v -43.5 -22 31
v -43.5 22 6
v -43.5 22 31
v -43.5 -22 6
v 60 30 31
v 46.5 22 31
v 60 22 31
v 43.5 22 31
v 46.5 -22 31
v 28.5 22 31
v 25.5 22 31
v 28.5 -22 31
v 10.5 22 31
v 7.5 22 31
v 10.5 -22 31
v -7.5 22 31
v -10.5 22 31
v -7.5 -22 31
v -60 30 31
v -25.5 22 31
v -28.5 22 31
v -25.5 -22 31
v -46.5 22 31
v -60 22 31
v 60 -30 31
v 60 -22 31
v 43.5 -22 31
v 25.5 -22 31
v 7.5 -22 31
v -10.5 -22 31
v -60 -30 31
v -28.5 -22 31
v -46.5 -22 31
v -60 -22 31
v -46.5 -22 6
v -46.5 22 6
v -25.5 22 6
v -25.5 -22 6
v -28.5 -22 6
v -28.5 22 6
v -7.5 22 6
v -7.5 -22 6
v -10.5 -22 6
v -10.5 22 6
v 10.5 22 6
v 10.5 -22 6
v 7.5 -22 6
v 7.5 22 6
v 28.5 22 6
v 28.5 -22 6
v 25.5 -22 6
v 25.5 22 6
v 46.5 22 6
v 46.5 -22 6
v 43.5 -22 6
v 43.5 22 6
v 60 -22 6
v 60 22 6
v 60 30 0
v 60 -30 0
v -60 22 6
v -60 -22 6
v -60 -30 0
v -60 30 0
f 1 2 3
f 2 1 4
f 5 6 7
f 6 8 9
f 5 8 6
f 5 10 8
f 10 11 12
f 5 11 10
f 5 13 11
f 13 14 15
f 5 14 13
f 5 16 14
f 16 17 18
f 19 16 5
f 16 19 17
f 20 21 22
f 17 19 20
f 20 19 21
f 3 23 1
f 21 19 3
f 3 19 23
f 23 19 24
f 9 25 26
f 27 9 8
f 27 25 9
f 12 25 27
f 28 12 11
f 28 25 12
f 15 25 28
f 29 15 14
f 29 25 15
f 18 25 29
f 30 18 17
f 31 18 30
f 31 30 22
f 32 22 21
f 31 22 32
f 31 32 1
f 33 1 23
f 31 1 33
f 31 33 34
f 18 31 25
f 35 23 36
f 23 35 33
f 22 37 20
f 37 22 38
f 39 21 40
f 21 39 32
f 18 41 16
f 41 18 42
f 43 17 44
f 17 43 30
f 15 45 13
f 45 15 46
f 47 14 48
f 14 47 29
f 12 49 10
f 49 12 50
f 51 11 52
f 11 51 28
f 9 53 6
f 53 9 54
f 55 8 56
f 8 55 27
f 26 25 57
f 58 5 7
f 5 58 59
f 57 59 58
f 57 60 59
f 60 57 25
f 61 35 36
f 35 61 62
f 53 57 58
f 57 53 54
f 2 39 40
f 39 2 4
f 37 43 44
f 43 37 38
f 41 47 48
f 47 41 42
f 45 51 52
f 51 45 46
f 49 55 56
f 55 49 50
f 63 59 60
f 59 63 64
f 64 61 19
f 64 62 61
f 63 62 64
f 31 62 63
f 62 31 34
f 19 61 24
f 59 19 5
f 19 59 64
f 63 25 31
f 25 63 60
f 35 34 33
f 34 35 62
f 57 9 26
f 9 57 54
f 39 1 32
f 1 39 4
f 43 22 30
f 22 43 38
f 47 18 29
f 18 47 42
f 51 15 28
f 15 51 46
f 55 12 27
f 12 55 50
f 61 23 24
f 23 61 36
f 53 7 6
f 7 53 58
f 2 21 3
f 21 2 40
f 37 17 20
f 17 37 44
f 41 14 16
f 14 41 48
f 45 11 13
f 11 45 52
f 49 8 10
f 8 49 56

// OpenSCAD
$fn = 32;

// ----------------------------------------------------------------------
// Rib frame 120 x 60 x 31
// 6 ribs at 18 mm pitch
// ----------------------------------------------------------------------

// --- parameters (mm) ---
frame = [120, 60, 6];  // base plate size (x, y, z)
rail_w = 8;            // side rail width
ribs = 6;              // number of ribs
rib_t = 3;             // rib thickness
rib_h = 25;            // rib height above the base plate
pitch = 18;            // pitch between rib centres

// --- derived feature positions (mm) ---
span = (ribs - 1) * pitch;          // = 90   distance between the outer ribs
origin_x = -span / 2;               // = -45   X of the first rib
rib_len = frame[1] - 2 * rail_w + 2;  // = 46   rib length, 1 mm into each rail
feature_centers = [
  [origin_x + 0 * pitch, 0],
  [origin_x + 1 * pitch, 0],
  [origin_x + 2 * pitch, 0],
  [origin_x + 3 * pitch, 0],
  [origin_x + 4 * pitch, 0],
  [origin_x + 5 * pitch, 0]
];   // rib centre line, drives the rib loop

// base plate, two side rails, then the ribs read straight off feature_centers
union() {
  translate([-frame[0] / 2, -frame[1] / 2, 0]) cube(frame);
  translate([-frame[0] / 2, -frame[1] / 2, 0]) cube([frame[0], rail_w, frame[2] + rib_h]);
  translate([-frame[0] / 2, frame[1] / 2 - rail_w, 0]) cube([frame[0], rail_w, frame[2] + rib_h]);
  for (centre = feature_centers)
    translate([centre[0] - rib_t / 2, centre[1] - rib_len / 2, frame[2] - 1])
      cube([rib_t, rib_len, rib_h + 1]);
}
